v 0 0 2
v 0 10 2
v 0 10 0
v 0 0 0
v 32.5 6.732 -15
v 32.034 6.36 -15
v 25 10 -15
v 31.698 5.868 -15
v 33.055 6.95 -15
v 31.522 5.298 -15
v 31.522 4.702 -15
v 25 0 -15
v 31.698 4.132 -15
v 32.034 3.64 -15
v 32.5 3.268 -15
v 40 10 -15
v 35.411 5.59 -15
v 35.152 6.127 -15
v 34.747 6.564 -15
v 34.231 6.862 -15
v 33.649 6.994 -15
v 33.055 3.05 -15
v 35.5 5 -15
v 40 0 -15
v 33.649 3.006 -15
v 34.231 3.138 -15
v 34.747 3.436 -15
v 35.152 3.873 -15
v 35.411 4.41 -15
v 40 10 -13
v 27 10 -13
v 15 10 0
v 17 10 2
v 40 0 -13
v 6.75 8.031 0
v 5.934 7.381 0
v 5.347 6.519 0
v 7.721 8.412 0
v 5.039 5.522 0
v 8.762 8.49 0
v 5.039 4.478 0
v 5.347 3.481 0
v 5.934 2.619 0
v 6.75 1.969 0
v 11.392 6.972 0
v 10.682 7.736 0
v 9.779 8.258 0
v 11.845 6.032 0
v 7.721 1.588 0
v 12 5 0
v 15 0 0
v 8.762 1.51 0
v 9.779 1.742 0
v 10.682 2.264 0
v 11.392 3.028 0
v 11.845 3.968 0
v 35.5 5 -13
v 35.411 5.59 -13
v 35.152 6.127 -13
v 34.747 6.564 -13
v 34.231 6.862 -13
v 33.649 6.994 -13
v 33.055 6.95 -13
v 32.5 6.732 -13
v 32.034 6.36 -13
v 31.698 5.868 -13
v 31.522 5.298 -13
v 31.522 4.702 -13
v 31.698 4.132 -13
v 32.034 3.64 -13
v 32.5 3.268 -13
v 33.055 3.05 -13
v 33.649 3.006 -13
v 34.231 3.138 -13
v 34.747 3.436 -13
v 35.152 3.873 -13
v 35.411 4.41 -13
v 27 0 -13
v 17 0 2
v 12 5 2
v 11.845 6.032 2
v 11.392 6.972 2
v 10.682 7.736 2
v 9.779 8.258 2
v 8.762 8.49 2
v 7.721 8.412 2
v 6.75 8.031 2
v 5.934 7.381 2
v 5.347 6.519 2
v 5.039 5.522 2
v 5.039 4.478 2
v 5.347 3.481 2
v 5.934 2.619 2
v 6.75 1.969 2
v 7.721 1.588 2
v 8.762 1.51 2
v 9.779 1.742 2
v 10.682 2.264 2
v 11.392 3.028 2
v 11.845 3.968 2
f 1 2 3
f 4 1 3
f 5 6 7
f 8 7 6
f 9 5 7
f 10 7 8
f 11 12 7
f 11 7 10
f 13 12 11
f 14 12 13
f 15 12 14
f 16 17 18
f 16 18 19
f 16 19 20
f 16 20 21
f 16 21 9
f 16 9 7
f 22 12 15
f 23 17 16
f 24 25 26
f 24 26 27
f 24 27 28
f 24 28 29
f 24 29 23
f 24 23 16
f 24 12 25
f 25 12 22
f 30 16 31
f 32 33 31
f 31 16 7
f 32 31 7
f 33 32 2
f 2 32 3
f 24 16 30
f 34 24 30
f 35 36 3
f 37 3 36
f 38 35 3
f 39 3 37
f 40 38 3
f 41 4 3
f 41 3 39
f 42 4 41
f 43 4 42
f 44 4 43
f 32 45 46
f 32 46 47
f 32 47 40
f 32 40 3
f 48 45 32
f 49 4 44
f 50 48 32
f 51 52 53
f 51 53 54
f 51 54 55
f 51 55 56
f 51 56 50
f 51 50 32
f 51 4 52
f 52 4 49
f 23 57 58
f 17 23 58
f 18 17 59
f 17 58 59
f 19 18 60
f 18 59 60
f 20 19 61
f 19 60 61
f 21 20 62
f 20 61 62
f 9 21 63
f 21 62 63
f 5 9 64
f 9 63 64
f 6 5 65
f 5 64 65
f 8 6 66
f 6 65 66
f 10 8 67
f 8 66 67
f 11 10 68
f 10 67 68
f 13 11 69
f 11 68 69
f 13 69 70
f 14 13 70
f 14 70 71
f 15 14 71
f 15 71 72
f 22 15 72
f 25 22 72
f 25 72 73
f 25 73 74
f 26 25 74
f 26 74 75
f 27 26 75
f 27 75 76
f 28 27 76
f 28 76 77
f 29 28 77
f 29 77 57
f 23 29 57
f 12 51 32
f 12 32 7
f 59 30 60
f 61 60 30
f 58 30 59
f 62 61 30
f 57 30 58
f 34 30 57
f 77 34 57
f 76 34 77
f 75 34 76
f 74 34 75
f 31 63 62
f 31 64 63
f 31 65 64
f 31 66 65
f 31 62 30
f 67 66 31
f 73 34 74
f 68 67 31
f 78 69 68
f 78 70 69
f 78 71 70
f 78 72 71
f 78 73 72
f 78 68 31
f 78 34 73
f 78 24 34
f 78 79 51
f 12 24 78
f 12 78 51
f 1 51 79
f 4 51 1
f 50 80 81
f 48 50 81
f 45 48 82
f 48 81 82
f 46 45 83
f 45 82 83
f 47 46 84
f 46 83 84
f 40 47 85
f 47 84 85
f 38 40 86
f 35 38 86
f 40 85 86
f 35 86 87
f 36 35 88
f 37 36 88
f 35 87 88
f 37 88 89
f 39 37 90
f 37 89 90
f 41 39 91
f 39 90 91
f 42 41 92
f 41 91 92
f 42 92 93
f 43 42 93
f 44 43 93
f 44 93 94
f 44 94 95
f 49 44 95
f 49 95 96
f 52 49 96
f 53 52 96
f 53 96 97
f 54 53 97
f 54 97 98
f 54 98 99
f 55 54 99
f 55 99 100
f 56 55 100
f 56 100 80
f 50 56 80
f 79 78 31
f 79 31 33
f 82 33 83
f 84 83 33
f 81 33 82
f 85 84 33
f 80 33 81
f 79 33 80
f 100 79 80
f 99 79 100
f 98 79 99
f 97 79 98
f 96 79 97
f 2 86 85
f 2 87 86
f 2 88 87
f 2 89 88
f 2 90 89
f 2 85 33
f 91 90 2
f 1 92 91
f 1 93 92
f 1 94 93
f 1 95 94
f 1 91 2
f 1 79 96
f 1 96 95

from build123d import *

# Parameters (mm, degrees)
BOSS_EXTRUDE1_DEPTH = 10
SKETCH3_R           = 3.5
SKETCH3_R_2         = 2
CUT_EXTRUDE1_DEPTH  = 30


with BuildPart() as part:
    # Sketch2 → Boss-Extrude1 (new body)
    with BuildSketch(Plane(origin=(0, 0, 0), x_dir=(1, 0, 0), z_dir=(0, 1, 0))):
        Polygon((0, 0), (15, 0), (25, 15), (40, 15), (40, 13), (27, 13), (17, -2), (0, -2), align=None)
    extrude(amount=BOSS_EXTRUDE1_DEPTH)

    # Sketch3 → Cut-Extrude1 (cut)
    with BuildSketch(Plane.XY.offset(2)):
        with Locations((8.5, 5)):
            Circle(SKETCH3_R)
        with Locations((33.5, 5)):
            Circle(SKETCH3_R_2)
    extrude(amount=-CUT_EXTRUDE1_DEPTH, mode=Mode.SUBTRACT)


solid = part.part
